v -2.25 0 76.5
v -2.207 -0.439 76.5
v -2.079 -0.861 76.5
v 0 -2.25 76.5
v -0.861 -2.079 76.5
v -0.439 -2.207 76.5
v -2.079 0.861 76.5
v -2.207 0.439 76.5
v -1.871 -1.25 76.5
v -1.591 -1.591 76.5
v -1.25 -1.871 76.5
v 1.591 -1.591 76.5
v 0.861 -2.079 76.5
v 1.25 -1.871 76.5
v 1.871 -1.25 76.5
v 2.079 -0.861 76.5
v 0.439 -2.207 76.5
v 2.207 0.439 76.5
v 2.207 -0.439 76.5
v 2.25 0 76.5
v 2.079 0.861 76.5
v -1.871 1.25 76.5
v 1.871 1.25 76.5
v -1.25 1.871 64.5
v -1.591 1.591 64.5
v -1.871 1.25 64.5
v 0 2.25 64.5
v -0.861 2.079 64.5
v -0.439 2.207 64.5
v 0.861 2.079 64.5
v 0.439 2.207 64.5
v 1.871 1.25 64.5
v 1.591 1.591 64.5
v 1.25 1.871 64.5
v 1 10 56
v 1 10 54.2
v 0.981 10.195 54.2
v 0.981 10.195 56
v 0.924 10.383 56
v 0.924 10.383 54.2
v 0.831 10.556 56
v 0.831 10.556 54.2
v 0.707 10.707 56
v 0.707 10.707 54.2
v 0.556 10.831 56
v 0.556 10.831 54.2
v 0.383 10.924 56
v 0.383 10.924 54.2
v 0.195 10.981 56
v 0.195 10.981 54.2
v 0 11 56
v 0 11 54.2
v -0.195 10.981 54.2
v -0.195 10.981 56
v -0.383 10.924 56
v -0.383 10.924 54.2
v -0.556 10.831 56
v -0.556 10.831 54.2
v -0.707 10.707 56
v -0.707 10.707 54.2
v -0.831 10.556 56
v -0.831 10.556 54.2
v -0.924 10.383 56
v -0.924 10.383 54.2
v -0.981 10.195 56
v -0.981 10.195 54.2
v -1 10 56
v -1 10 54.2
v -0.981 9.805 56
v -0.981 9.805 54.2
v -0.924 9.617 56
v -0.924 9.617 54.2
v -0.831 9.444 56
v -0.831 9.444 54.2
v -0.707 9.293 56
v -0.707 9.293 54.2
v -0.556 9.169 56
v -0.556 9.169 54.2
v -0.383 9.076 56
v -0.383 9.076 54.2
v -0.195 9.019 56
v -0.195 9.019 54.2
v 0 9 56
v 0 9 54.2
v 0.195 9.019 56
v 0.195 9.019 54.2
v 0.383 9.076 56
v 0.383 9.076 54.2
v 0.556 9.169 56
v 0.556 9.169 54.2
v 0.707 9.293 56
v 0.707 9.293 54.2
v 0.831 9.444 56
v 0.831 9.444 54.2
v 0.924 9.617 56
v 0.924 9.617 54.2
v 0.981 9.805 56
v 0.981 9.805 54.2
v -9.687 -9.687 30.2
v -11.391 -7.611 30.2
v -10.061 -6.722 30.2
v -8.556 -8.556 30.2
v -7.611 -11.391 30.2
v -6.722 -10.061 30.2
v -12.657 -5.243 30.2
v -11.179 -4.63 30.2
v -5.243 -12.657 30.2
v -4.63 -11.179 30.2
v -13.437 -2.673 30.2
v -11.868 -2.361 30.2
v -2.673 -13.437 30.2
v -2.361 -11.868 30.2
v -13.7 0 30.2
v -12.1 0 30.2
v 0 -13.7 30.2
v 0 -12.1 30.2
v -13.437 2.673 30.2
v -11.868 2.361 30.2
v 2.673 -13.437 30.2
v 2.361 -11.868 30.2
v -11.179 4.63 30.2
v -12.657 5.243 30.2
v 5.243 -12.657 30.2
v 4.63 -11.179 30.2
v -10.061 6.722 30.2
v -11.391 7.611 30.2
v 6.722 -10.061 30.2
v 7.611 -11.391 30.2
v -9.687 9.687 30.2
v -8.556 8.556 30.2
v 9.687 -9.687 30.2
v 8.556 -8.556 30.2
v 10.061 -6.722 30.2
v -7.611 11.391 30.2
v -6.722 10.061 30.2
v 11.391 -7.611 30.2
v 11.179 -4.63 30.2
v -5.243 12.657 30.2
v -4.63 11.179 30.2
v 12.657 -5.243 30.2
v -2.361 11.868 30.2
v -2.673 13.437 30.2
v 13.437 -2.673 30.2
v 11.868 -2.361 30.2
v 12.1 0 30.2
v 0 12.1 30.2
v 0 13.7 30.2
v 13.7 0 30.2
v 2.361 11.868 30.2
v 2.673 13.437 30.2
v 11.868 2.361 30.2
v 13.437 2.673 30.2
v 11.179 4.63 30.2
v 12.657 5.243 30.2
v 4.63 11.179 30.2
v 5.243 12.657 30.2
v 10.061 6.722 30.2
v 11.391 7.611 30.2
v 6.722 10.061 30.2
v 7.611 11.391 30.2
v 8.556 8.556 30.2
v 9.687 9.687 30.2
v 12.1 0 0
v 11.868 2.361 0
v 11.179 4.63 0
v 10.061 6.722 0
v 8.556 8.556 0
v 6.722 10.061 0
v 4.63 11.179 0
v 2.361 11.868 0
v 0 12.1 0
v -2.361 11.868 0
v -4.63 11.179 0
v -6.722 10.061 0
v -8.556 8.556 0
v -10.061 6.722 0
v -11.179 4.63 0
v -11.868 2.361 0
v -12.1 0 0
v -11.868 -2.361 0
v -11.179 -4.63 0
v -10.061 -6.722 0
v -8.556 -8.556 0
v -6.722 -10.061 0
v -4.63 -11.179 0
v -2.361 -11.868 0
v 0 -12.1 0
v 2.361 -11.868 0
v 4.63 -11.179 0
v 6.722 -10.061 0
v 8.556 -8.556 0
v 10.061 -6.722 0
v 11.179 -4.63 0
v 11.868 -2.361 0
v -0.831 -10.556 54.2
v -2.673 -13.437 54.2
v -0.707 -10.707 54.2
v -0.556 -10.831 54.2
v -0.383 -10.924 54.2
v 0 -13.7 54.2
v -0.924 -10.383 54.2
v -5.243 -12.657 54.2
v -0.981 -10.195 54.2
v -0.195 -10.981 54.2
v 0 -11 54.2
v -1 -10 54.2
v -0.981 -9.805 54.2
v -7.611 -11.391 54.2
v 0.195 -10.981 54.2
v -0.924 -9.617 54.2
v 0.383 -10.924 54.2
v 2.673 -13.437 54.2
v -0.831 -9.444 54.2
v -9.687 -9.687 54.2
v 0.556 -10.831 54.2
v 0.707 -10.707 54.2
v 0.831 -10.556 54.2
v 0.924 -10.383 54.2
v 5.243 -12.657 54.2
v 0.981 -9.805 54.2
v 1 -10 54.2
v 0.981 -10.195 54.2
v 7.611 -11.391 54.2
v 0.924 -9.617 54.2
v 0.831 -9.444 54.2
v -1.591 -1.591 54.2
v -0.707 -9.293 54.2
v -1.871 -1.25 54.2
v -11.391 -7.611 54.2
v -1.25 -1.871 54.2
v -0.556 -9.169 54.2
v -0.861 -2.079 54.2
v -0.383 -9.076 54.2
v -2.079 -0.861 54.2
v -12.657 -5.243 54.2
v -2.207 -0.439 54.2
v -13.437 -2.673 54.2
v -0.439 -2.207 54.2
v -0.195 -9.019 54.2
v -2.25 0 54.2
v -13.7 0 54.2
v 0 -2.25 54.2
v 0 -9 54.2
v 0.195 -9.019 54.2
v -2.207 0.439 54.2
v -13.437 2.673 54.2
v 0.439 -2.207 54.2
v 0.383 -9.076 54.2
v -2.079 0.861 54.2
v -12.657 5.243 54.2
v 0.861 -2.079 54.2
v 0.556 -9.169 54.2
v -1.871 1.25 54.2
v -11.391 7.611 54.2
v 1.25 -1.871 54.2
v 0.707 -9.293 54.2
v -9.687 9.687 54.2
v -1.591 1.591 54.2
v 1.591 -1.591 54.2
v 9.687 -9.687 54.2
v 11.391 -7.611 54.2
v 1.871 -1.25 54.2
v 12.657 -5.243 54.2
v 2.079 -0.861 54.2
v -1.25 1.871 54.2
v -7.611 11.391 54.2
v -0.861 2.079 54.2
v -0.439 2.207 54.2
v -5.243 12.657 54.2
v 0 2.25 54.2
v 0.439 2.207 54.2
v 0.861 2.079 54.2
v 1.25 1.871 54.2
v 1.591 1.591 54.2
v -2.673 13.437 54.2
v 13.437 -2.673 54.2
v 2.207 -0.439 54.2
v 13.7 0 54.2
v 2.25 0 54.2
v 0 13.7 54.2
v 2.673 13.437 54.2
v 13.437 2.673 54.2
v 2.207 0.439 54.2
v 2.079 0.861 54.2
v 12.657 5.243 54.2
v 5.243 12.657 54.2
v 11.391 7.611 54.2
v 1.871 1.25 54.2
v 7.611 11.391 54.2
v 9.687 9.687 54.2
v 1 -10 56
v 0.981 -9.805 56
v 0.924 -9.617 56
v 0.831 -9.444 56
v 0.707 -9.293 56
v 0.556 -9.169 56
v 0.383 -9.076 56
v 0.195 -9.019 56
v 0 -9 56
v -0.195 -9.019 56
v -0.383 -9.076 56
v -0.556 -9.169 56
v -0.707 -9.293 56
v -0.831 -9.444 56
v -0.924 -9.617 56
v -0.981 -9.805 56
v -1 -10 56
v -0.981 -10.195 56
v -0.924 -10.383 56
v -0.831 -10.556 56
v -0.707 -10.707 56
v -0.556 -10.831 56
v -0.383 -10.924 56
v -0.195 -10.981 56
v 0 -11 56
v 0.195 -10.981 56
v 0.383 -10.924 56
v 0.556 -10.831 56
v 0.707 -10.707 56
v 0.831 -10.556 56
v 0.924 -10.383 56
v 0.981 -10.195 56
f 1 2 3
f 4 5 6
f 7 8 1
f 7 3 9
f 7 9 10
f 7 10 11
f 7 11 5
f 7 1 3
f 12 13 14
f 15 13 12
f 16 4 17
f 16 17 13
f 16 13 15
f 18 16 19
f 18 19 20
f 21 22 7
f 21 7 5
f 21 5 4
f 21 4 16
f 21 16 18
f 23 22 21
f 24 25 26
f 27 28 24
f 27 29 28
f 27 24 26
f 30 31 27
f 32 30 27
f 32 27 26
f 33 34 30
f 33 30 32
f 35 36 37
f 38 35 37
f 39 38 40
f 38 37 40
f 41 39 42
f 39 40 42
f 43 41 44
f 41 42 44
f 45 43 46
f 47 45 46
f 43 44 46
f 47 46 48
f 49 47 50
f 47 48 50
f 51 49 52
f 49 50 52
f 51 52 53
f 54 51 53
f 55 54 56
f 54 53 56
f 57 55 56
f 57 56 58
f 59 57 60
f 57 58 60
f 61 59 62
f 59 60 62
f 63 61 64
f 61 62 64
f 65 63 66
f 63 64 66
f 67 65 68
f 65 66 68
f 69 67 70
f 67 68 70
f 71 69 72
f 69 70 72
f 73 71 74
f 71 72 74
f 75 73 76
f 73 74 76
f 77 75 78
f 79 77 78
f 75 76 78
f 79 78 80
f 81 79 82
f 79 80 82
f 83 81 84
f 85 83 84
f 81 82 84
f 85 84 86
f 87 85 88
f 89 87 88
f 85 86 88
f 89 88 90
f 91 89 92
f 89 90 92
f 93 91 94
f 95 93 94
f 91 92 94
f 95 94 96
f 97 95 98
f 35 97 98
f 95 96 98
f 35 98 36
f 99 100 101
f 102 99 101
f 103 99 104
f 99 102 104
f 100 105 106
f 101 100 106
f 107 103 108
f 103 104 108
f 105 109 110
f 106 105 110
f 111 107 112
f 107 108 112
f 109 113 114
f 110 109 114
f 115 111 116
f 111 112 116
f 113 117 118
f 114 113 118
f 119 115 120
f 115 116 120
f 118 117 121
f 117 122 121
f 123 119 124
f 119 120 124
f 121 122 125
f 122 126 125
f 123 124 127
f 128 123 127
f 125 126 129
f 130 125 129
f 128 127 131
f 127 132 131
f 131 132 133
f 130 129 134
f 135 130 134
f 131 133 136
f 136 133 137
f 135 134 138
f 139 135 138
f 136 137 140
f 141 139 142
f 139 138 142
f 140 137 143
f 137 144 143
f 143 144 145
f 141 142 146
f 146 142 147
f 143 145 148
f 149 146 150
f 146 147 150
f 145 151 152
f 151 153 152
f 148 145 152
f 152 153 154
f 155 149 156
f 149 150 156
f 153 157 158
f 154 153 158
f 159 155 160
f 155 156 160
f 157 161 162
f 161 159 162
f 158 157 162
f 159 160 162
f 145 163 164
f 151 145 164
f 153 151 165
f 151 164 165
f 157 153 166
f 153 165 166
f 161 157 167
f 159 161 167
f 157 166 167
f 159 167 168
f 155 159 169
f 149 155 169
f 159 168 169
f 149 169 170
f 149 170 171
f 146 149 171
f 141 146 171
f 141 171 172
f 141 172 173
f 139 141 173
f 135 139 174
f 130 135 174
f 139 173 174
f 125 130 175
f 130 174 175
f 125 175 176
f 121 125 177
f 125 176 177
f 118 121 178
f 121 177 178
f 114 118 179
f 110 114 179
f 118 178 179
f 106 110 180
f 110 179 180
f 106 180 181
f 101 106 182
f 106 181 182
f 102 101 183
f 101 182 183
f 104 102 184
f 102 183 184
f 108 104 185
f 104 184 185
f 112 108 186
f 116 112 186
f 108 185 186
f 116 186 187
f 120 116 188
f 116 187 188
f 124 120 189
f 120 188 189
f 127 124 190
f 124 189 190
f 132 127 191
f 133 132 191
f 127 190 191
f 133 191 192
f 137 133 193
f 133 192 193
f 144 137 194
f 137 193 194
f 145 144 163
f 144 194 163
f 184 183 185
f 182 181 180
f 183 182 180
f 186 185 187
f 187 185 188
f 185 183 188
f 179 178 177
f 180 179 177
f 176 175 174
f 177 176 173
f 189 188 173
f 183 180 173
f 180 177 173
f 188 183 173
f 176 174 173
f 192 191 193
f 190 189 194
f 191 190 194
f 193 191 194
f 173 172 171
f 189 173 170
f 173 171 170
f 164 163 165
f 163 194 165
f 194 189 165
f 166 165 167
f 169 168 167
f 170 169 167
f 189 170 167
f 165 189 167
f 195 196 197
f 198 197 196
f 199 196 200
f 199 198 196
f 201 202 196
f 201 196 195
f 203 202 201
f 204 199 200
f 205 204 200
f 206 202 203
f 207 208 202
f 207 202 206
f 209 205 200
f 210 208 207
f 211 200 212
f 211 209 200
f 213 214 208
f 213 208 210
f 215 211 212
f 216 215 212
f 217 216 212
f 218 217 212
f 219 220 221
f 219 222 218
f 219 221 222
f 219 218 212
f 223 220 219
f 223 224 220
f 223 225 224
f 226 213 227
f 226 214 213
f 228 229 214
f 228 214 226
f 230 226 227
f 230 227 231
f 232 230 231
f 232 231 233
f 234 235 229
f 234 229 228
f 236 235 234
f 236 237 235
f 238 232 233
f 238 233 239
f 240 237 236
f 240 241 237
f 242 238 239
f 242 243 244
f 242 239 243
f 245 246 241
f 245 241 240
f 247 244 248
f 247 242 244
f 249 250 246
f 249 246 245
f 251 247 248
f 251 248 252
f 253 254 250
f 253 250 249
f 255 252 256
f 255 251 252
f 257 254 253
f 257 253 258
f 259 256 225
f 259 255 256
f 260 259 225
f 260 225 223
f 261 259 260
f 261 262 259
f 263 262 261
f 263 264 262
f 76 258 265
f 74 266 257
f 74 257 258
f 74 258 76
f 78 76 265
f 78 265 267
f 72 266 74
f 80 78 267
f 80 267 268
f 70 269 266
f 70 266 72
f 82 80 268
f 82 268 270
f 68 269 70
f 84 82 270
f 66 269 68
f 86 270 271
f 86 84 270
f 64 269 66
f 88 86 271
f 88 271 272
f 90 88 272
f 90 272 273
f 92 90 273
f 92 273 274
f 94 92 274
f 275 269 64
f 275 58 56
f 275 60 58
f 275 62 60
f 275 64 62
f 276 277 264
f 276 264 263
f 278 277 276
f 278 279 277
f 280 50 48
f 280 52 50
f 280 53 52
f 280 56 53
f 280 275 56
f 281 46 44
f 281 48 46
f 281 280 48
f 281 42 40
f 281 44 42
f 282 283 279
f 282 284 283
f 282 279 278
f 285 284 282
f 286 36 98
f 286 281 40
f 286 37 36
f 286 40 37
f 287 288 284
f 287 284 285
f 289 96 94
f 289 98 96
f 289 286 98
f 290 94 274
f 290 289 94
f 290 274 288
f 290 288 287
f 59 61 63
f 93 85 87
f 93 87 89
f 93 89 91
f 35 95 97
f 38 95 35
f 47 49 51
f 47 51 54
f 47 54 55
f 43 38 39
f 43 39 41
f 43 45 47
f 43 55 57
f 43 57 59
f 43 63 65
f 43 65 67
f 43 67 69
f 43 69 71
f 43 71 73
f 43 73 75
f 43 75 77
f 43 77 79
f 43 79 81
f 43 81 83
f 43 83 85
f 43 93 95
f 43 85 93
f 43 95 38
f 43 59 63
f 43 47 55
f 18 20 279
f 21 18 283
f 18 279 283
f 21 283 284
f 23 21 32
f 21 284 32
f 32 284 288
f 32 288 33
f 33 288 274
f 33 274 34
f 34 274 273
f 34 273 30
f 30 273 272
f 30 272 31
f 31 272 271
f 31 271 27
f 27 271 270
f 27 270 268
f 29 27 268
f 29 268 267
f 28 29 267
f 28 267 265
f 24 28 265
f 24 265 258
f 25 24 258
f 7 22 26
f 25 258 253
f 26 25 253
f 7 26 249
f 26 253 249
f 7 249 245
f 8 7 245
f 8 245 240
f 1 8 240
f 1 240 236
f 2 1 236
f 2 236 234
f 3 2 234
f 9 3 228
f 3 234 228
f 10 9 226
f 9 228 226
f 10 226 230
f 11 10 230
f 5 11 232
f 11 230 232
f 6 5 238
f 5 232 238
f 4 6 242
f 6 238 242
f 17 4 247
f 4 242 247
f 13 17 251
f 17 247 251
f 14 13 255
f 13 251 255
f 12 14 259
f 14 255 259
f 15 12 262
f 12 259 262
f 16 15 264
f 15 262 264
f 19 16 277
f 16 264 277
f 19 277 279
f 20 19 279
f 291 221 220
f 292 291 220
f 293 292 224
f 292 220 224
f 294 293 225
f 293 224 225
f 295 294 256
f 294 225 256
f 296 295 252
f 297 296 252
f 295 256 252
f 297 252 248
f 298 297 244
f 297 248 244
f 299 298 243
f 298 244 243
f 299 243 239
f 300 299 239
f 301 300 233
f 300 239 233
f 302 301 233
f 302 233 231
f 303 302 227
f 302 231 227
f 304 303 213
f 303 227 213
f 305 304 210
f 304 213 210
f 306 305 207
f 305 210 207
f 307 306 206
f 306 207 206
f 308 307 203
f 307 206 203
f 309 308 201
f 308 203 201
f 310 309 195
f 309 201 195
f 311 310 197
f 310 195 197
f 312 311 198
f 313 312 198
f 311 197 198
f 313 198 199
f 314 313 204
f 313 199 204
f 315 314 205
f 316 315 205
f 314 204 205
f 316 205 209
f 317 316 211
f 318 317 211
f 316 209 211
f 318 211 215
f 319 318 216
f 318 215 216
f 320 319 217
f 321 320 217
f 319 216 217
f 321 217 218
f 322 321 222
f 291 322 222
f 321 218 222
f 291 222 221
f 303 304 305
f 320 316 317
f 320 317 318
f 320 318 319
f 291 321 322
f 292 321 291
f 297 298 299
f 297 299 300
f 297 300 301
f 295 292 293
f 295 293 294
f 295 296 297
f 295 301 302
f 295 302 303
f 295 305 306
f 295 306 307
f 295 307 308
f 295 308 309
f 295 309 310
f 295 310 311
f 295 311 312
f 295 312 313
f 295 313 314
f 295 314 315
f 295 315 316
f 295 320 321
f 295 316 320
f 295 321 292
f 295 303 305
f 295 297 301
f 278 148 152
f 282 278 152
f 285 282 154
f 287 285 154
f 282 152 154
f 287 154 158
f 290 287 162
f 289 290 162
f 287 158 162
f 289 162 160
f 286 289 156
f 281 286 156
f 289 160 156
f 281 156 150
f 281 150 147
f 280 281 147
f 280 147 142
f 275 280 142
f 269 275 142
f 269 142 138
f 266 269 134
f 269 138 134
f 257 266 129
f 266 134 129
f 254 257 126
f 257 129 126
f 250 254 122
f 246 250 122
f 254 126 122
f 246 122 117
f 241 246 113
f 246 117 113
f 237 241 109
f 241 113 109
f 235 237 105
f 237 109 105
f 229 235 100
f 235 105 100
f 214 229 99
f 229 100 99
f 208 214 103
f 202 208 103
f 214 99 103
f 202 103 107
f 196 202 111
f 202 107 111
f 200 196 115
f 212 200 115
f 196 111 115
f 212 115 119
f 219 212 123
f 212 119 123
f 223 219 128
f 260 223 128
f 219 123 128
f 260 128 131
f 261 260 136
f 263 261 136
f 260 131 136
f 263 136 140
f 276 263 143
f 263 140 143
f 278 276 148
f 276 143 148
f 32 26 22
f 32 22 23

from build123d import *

# Parameters (mm, degrees)
SKETCH1_R           = 12.1
BOSS_EXTRUDE1_DEPTH = 30.2
SKETCH2_R           = 13.7
BOSS_EXTRUDE2_DEPTH = 24
SKETCH4_R           = 1
BOSS_EXTRUDE3_DEPTH = 1.8
SKETCH5_R           = 2.25
BOSS_EXTRUDE4_DEPTH = 22.3
CUT_EXTRUDE1_DEPTH  = 12


with BuildPart() as part:
    # Sketch1 → Boss-Extrude1 (new body)
    with BuildSketch(Plane.XY):
        Circle(SKETCH1_R)
    extrude(amount=BOSS_EXTRUDE1_DEPTH)

    # Sketch2 → Boss-Extrude2 (add)
    with BuildSketch(Plane.XY.offset(30.2)):
        Circle(SKETCH2_R)
    extrude(amount=BOSS_EXTRUDE2_DEPTH)

    # Sketch4 → Boss-Extrude3 (add)
    with BuildSketch(Plane.XY.offset(54.2)):
        with Locations((0, 10)):
            Circle(SKETCH4_R)
        with Locations((0, -10)):
            Circle(SKETCH4_R)
    extrude(amount=BOSS_EXTRUDE3_DEPTH)

    # Sketch5 → Boss-Extrude4 (add)
    with BuildSketch(Plane.XY.offset(54.2)):
        Circle(SKETCH5_R)
    extrude(amount=BOSS_EXTRUDE4_DEPTH)

    # Sketch6 → Cut-Extrude1 (cut)
    with BuildSketch(Plane.XY.offset(76.5)):
        Polygon((-55.042727248, 1.25), (-1.870828693, 1.25), (1.870828693, 1.25), (55.042727248, 1.25), (55.042727248, 107.593797109), (-55.042727248, 107.593797109), align=None)
    extrude(amount=-CUT_EXTRUDE1_DEPTH, mode=Mode.SUBTRACT)


solid = part.part
